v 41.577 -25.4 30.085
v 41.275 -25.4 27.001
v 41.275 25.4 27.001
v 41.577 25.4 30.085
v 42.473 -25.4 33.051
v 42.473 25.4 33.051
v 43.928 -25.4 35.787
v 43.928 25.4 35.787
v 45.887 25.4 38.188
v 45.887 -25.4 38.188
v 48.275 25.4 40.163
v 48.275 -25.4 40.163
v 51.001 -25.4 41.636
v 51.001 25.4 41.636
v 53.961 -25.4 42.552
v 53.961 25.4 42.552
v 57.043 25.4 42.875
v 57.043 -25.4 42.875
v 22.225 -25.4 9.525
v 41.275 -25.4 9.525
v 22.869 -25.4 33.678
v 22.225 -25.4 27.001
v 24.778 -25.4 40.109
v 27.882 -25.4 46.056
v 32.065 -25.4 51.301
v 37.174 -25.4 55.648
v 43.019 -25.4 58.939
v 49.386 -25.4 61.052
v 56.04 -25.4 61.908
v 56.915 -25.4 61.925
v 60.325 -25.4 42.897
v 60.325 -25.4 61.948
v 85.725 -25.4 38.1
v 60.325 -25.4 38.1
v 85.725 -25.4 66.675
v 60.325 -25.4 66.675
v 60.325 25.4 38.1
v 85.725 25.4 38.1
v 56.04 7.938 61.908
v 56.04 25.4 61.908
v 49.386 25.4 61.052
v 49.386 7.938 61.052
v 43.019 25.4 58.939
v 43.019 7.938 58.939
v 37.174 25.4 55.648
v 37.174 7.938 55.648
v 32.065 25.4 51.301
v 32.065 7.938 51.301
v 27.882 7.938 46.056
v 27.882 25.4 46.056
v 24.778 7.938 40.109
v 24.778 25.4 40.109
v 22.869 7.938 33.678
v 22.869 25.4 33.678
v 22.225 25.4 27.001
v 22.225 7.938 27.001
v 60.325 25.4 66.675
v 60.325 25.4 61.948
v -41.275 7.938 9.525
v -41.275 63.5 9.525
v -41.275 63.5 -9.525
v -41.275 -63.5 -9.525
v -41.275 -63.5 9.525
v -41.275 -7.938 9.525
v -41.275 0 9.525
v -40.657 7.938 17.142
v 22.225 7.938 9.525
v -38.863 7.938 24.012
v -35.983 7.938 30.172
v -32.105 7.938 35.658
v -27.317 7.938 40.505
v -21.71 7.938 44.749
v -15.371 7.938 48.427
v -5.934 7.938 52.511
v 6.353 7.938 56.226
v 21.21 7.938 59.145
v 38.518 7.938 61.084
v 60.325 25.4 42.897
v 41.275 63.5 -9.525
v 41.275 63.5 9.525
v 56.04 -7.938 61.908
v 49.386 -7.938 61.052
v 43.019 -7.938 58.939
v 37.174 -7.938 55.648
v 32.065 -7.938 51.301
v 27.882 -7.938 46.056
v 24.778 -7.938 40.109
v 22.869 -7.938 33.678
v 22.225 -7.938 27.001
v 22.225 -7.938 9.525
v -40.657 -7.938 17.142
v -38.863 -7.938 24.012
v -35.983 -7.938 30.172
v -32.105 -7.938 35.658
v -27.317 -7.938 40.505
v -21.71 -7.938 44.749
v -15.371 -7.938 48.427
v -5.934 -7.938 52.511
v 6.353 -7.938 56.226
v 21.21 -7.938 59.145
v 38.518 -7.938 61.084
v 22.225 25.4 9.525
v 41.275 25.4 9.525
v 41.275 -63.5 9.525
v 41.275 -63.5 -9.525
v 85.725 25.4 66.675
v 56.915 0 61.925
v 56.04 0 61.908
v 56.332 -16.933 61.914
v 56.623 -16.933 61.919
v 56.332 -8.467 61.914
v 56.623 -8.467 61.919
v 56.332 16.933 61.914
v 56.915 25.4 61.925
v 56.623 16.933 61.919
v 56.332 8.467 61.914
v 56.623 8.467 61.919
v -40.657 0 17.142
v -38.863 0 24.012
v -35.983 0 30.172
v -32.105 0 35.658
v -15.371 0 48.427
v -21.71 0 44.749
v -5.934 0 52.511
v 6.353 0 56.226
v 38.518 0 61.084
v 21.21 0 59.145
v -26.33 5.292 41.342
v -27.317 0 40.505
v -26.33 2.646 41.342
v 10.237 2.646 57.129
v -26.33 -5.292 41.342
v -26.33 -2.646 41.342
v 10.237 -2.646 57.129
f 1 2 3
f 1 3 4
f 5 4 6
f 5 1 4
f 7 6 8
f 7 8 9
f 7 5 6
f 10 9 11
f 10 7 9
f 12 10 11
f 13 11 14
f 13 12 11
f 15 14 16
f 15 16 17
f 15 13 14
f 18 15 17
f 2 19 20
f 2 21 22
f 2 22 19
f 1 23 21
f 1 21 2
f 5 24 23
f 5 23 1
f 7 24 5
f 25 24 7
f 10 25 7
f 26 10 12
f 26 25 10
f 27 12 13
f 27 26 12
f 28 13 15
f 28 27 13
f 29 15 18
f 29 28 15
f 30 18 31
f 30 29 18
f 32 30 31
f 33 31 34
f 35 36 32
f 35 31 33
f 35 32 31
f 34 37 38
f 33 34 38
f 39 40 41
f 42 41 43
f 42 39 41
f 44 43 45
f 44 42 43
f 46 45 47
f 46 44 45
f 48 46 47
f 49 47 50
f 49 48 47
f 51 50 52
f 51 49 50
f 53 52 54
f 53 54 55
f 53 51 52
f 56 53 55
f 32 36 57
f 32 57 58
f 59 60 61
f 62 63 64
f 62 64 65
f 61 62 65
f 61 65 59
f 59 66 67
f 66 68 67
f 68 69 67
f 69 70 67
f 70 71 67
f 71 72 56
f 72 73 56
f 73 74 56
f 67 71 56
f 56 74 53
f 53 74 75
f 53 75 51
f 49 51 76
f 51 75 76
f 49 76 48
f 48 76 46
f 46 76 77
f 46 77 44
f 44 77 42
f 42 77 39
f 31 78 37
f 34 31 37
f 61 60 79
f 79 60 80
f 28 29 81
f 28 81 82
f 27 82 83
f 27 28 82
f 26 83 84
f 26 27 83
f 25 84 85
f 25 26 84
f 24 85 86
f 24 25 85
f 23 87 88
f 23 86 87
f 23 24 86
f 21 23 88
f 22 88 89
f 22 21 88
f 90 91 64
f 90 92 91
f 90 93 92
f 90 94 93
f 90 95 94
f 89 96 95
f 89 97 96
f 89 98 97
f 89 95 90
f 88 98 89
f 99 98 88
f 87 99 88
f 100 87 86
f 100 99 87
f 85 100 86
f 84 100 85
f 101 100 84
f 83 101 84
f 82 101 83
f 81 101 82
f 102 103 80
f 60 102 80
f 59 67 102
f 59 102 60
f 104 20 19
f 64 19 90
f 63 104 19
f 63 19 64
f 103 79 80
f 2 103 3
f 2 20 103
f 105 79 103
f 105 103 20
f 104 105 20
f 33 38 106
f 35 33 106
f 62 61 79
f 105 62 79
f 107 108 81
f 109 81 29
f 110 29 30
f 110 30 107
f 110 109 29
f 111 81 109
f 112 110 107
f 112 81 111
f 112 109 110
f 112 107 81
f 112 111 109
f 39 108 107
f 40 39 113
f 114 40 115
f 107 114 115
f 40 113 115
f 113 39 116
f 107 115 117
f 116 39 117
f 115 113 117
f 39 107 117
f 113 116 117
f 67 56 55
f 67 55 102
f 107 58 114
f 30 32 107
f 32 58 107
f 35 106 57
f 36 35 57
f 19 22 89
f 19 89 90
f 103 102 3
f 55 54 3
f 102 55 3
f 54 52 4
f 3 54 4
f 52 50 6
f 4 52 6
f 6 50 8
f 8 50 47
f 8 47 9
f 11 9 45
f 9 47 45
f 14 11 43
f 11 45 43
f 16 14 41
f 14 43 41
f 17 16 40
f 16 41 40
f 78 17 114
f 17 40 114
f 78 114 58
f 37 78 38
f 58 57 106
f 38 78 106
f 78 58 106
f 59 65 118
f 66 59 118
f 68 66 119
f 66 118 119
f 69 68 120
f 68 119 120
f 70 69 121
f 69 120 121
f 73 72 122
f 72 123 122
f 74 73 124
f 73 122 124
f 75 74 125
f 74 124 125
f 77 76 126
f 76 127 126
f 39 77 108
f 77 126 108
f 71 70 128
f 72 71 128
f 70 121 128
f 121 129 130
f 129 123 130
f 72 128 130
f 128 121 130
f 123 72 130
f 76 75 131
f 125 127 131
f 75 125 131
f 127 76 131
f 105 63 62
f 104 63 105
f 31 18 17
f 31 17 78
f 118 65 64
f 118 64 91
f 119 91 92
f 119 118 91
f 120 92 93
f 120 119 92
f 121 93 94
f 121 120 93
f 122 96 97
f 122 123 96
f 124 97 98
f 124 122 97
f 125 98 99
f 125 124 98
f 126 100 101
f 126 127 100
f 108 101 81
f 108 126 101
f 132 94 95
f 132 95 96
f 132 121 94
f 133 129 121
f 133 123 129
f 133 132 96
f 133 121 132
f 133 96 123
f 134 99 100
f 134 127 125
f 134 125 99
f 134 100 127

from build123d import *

# Parameters (mm, degrees)
F1_DEPTH = 63.5
F2_DEPTH = 25.4
F3_DEPTH = 7.9375


with BuildPart() as f1:
    # F0 (on Front) → F1 (new body, symmetric)
    with BuildSketch(Plane.XZ):
        Polygon((41.275, -9.525), (41.275, 9.525), (22.225, 9.525), (-41.275, 9.525), (-41.275, -9.525), align=None)
    extrude(amount=F1_DEPTH, both=True)

    # F0 (on Front) → F2 (join, symmetric)
    with BuildSketch(Plane.XZ):
        with BuildLine():
            Line((22.225, 9.525), (41.275, 9.525))
            Line((41.275, 9.525), (41.275, 27.00056))
            ThreePointArc((41.275, 27.00056), (45.88692, 38.187993), (57.043019, 42.8752))
            Line((57.043019, 42.8752), (60.325, 42.897318))
            Line((60.325, 42.897318), (60.325, 61.94775))
            Line((60.325, 61.94775), (56.914641, 61.924767))
            add(Edge.make_bspline(
                [(56.039947, 61.907915), (56.331704, 61.913887), (56.623274, 61.919503), (56.914641, 61.924767)],
                knots=[110.599591, 110.599591, 110.599591, 110.599591, 111.296636, 111.296636, 111.296636, 111.296636], degree=3))
            ThreePointArc((56.039947, 61.907915), (32.064903, 51.300633), (22.225, 27.00056))
            Line((22.225, 27.00056), (22.225, 9.525))
        make_face()
        Polygon((60.325, 42.897318), (60.325, 42.8752), (60.325, 38.1), (85.725, 38.1), (85.725, 66.675), (60.325, 66.675), (60.325, 61.94775), align=None)
    extrude(amount=F2_DEPTH, both=True)

    # F0 (on Front) → F3 (join, symmetric)
    with BuildSketch(Plane.XZ):
        with BuildLine():
            Line((-41.275, 9.525), (22.225, 9.525))
            Line((22.225, 9.525), (22.225, 27.00056))
            ThreePointArc((22.225, 27.00056), (32.064903, 51.300633), (56.039947, 61.907915))
            add(Edge.make_bspline(
                [(-41.275, 9.525), (-41.269693, 51.029399), (9.747121, 60.960284), (56.039947, 61.907915)],
                knots=[0, 0, 0, 0, 110.599591, 110.599591, 110.599591, 110.599591], degree=3))
        make_face()
    extrude(amount=F3_DEPTH, both=True)


solid = f1.part
